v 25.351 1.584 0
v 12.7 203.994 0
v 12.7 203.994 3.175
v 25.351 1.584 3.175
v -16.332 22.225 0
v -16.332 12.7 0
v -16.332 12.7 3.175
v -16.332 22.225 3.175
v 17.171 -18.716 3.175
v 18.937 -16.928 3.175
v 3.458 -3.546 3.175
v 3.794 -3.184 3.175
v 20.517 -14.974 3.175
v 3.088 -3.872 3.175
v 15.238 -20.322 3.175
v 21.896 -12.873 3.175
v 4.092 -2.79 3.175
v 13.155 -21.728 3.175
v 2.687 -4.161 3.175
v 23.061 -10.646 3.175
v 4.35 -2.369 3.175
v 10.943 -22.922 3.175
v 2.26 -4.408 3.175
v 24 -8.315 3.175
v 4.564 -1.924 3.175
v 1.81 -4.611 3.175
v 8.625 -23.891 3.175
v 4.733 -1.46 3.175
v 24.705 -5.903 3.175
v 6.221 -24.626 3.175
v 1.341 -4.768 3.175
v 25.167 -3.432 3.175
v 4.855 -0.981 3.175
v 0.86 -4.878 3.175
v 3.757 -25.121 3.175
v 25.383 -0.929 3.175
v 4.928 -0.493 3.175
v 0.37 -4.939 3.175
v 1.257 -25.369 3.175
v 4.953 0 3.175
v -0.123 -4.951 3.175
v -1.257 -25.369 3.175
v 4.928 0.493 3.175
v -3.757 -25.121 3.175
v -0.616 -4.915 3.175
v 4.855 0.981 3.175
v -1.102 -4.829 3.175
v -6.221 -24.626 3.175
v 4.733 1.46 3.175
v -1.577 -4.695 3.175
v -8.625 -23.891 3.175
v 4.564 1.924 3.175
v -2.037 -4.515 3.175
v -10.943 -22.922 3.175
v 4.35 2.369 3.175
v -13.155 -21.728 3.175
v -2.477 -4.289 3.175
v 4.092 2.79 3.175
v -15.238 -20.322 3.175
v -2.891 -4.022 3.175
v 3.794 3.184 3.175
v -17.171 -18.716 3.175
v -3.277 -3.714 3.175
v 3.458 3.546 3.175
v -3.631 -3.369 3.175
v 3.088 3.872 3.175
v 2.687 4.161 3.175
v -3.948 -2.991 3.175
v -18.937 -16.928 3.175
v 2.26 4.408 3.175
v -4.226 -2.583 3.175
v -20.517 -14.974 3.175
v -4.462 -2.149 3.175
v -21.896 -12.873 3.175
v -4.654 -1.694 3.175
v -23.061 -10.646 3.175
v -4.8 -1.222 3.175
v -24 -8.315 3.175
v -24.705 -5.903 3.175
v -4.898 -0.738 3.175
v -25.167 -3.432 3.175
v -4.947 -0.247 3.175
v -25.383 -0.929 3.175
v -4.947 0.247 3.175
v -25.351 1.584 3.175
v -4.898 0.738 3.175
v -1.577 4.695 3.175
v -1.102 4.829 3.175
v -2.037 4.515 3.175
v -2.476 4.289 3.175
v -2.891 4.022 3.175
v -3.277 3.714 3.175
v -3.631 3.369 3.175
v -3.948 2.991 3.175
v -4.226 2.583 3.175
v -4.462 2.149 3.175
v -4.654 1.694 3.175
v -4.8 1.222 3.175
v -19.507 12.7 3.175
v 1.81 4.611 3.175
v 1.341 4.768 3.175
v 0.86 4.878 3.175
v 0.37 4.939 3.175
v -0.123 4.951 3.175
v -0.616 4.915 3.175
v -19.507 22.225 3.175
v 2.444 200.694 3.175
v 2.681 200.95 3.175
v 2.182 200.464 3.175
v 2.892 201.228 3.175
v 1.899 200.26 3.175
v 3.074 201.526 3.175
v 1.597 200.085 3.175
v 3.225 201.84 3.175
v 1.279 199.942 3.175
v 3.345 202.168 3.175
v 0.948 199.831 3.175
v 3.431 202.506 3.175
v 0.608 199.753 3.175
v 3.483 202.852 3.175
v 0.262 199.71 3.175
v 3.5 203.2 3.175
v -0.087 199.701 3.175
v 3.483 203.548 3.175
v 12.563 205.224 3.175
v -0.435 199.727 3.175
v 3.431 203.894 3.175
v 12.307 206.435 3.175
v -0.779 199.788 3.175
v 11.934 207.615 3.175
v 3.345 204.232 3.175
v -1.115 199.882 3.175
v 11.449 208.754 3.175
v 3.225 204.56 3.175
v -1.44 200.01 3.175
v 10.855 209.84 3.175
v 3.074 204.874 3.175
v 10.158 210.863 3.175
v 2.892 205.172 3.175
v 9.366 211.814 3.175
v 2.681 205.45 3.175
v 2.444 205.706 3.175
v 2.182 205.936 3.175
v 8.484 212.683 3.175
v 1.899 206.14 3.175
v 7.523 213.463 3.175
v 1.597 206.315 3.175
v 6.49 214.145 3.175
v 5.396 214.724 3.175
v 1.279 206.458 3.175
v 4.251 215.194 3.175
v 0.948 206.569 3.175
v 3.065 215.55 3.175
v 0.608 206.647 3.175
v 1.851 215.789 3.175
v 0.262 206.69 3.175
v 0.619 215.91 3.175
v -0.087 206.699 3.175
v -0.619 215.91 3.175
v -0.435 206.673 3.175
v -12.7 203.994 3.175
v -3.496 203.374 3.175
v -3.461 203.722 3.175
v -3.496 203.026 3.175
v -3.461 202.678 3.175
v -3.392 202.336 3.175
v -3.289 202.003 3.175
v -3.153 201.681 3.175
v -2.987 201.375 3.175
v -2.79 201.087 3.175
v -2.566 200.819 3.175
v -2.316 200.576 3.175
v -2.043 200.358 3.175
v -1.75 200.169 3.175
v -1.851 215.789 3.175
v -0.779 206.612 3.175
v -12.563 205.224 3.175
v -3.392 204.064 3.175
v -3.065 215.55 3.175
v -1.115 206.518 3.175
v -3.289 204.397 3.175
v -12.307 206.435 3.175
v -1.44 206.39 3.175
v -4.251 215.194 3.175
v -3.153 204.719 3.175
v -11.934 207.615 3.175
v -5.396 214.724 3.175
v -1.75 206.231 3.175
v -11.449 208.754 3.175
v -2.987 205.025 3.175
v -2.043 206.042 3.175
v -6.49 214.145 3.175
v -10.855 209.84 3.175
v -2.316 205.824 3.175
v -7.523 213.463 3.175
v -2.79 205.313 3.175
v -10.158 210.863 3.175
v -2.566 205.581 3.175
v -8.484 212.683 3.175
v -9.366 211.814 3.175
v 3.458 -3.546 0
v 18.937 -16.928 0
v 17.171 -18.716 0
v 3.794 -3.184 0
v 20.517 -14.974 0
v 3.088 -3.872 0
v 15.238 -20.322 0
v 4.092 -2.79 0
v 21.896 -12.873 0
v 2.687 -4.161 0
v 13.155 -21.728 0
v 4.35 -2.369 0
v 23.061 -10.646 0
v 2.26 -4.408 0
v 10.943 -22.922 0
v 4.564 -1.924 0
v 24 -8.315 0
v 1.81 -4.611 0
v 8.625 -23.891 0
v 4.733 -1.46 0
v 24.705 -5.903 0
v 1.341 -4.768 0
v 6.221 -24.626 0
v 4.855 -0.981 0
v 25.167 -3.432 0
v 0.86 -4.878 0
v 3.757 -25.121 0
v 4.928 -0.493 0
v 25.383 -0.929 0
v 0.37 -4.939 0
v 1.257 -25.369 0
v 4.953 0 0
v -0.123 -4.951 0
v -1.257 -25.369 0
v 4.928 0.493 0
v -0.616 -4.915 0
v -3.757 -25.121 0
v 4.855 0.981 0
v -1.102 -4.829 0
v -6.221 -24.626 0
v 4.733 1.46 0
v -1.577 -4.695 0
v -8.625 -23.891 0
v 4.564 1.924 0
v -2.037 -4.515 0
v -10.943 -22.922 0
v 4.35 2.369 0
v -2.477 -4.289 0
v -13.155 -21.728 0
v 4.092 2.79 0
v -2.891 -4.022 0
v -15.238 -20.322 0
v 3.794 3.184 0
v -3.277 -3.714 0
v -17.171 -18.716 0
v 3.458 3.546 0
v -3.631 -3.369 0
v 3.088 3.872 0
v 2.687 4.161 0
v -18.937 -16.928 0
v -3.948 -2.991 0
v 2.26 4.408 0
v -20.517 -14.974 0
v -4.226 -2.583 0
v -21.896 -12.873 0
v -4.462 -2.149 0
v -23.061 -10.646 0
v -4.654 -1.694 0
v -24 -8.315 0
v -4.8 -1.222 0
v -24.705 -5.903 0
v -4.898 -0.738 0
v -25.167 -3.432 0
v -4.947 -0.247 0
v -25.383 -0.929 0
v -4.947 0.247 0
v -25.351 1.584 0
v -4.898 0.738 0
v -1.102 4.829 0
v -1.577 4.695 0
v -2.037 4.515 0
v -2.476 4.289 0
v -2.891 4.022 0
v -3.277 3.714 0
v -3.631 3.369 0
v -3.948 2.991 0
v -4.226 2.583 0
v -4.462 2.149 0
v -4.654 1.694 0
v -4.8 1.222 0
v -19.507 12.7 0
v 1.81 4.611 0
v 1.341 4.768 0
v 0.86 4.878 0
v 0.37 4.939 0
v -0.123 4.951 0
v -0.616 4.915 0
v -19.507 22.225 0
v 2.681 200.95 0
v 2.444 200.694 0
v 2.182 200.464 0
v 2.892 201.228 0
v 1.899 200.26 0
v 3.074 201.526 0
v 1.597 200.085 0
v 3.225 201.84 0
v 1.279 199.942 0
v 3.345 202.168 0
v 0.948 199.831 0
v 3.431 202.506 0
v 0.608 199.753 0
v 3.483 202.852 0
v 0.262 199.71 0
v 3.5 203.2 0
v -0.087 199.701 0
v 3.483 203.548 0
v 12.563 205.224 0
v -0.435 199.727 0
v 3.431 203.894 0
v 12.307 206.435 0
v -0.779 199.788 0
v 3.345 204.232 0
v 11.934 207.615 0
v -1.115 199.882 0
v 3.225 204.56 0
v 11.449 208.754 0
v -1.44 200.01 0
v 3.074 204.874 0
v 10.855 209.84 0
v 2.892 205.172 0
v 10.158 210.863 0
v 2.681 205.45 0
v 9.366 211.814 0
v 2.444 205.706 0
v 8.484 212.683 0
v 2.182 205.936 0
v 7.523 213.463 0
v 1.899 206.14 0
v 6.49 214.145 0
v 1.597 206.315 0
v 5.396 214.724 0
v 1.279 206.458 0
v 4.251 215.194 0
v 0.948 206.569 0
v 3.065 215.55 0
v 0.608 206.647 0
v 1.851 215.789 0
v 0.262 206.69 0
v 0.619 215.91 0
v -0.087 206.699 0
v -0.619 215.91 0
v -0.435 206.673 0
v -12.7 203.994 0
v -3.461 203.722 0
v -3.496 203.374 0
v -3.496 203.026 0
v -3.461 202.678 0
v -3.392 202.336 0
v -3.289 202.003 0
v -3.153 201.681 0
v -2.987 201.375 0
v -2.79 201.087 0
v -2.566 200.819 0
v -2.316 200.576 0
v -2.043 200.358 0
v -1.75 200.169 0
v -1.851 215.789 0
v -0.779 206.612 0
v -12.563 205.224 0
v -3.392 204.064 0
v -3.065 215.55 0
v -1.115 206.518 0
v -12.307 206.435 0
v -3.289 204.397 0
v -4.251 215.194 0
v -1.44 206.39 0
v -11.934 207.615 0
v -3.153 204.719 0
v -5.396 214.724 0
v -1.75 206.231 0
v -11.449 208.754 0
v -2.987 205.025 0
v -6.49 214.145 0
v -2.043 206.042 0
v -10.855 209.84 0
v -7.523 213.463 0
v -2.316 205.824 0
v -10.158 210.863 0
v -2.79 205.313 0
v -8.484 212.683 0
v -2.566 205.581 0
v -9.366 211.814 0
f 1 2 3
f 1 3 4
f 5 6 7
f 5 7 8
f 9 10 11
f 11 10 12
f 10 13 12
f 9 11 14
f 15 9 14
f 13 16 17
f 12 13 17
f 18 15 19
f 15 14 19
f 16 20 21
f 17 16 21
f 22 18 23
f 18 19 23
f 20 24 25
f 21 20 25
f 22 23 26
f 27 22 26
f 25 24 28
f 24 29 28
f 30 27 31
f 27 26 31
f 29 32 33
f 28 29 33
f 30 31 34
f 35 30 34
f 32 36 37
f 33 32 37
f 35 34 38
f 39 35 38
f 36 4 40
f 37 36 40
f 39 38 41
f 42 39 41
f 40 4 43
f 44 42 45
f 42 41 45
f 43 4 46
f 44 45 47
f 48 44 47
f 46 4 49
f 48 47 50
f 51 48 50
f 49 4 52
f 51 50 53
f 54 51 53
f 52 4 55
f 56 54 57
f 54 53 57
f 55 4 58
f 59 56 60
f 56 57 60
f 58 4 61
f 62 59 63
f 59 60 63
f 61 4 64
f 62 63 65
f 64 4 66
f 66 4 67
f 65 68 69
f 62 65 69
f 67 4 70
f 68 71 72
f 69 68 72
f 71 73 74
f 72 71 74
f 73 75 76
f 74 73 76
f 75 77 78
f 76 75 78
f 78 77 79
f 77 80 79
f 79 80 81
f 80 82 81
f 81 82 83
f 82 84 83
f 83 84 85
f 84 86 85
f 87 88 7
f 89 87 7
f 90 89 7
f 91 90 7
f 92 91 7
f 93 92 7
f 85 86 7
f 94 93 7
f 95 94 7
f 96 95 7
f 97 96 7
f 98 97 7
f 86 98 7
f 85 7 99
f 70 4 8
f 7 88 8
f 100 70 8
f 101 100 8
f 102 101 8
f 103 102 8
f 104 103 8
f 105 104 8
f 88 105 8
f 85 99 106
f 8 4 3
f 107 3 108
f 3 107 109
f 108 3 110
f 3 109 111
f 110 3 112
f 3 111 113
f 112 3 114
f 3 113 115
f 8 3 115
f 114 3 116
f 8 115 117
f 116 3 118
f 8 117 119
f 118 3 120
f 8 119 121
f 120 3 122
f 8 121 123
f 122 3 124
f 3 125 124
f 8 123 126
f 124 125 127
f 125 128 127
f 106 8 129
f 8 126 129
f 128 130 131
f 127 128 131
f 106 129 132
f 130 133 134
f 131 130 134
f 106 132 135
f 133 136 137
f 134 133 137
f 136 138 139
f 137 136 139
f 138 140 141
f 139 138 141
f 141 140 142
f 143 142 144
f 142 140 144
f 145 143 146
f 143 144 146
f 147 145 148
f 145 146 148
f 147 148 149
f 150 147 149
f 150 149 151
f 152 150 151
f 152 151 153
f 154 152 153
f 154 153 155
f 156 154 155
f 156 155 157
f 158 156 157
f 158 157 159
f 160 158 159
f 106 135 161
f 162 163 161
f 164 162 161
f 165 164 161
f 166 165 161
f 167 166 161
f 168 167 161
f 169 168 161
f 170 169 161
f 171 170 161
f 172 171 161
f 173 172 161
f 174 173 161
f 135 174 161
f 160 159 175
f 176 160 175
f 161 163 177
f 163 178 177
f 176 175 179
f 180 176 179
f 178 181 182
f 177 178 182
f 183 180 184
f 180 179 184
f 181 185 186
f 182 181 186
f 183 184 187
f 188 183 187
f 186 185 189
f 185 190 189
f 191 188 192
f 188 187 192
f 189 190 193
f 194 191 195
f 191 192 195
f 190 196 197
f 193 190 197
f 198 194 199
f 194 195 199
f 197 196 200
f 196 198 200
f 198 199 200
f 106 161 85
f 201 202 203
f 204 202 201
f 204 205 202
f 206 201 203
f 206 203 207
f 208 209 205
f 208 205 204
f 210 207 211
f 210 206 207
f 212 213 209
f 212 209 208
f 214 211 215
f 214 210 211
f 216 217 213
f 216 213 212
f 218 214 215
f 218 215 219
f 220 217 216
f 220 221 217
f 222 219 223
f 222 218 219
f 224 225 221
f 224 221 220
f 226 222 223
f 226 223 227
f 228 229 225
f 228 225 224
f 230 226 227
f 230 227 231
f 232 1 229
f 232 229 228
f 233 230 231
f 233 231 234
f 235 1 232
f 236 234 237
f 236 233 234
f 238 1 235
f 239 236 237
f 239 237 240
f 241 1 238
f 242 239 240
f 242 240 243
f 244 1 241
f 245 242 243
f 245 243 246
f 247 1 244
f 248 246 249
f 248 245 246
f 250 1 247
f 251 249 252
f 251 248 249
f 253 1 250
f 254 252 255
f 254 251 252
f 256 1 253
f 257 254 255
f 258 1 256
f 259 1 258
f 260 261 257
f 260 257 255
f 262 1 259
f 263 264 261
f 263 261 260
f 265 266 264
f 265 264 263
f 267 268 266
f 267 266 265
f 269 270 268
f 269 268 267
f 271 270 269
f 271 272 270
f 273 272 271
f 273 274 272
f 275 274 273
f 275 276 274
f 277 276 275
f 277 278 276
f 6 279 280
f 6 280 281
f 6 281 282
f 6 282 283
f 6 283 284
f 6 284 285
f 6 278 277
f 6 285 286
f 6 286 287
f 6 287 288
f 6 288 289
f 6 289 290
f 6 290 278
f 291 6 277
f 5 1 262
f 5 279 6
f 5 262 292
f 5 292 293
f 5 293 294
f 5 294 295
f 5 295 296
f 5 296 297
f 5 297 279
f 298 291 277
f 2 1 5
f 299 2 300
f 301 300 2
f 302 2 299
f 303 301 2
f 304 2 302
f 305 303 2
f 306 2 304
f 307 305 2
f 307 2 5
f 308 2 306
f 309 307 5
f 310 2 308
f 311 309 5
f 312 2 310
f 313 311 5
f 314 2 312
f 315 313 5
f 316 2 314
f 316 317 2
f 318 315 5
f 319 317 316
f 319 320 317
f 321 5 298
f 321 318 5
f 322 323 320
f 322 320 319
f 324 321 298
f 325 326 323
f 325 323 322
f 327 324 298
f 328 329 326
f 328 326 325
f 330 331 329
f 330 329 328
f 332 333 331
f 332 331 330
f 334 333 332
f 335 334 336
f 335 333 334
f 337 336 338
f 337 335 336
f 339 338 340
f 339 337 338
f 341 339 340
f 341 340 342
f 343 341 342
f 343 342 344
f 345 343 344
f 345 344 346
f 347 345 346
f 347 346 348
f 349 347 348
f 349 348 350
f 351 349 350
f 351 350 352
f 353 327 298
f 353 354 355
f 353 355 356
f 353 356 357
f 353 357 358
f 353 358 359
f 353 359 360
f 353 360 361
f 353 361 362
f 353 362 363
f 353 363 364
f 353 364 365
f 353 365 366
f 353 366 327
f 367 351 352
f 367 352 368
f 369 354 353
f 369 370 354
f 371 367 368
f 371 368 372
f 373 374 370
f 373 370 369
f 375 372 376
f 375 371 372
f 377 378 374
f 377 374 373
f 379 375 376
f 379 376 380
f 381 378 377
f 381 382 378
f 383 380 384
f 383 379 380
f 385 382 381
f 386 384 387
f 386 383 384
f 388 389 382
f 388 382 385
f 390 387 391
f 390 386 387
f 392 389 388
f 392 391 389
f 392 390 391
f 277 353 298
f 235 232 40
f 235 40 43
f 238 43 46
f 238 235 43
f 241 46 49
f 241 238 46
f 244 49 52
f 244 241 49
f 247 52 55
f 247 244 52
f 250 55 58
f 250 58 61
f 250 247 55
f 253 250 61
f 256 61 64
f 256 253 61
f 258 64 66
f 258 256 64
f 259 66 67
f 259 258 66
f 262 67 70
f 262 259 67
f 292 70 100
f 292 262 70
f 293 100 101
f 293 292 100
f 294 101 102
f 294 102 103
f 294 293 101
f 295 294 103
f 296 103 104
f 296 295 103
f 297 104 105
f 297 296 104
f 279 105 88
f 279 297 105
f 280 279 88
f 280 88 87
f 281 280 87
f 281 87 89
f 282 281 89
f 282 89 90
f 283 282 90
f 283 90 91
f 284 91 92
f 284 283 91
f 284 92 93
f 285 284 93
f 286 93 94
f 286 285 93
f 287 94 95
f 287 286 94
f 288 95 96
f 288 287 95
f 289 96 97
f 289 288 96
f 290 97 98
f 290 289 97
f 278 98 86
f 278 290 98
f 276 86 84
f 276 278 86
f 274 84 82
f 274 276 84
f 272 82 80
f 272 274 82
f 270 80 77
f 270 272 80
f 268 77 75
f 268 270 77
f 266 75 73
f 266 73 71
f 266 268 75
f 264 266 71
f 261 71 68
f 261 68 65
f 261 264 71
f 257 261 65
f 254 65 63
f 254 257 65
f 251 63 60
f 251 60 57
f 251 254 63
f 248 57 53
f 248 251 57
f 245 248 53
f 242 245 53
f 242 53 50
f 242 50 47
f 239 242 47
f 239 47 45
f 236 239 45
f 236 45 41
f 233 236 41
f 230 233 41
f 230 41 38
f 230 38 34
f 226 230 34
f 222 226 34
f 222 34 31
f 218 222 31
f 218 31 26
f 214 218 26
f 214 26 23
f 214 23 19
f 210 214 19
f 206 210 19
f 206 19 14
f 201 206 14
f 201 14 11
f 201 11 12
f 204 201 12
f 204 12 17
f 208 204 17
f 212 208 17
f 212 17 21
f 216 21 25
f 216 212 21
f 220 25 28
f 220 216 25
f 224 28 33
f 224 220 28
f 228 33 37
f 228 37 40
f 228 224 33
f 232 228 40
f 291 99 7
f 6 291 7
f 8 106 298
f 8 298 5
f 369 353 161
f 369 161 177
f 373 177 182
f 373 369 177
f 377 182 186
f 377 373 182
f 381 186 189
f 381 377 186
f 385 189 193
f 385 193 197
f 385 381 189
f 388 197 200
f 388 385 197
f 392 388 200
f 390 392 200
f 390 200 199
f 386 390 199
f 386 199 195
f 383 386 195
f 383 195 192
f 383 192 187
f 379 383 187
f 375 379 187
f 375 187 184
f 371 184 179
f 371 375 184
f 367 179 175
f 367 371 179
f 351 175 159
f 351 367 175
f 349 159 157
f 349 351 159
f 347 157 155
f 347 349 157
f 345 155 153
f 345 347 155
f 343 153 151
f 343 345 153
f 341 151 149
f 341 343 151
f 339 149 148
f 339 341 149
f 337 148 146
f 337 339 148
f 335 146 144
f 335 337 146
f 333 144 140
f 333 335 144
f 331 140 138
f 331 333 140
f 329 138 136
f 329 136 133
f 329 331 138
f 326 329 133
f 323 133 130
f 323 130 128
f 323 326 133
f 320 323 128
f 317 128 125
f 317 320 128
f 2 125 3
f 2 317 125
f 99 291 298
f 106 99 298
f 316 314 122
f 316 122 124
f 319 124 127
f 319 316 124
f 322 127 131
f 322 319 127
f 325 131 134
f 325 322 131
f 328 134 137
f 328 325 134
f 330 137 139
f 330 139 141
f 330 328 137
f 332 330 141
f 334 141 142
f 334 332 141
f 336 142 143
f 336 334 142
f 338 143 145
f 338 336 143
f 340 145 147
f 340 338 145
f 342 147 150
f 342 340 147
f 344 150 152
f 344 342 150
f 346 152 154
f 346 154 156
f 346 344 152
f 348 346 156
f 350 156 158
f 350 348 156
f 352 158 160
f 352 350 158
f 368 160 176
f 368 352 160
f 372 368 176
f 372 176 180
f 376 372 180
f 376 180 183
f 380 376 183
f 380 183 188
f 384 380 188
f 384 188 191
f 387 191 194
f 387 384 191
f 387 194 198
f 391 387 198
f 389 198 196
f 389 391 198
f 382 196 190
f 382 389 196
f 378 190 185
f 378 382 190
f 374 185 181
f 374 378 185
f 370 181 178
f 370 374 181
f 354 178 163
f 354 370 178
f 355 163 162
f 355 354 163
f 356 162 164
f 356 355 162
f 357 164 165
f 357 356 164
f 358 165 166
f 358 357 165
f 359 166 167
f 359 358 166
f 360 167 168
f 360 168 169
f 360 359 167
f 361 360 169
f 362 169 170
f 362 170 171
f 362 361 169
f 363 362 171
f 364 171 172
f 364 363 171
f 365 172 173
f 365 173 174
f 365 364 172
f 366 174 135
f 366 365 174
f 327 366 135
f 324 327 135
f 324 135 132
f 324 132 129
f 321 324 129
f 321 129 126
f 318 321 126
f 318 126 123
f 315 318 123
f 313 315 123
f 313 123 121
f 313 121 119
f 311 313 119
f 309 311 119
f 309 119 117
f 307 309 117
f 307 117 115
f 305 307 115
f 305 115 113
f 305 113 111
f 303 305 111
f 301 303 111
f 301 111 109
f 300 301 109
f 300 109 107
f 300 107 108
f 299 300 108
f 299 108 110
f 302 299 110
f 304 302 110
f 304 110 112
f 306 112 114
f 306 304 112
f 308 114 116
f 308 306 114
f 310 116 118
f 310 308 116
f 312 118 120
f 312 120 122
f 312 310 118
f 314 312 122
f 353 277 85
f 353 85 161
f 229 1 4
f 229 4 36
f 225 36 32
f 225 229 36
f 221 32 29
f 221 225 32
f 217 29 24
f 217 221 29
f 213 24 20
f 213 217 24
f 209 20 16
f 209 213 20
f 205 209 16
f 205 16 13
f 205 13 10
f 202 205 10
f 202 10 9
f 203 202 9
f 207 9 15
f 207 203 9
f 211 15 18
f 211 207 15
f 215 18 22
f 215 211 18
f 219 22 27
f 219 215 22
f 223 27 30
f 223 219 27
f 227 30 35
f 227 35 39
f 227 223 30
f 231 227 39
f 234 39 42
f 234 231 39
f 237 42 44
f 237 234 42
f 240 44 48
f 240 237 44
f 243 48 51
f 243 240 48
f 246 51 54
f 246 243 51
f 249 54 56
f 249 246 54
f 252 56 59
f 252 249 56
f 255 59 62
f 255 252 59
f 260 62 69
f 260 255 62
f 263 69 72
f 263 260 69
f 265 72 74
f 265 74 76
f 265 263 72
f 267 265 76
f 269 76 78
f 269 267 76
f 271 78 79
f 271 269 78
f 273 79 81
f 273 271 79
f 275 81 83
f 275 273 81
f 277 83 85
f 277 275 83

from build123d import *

# Parameters (mm, degrees)
SKETCH1_R           = 4.953
SKETCH1_R_2         = 3.5
SKETCH1_W           = 3.175
SKETCH1_H           = 9.525
BOSS_EXTRUDE1_DEPTH = 3.175


with BuildPart() as part:
    # Sketch1 → Boss-Extrude1 (new body)
    with BuildSketch(Plane.XY):
        with BuildLine():
            Line((-25.350535869, 1.58440246), (-12.7, 203.993746978))
            ThreePointArc((-12.7, 203.993746978), (0, 215.924780323), (12.7, 203.993746978))
            Line((12.7, 203.993746978), (25.350535869, 1.58440246))
            ThreePointArc((25.350535869, 1.58440246), (0, -25.4), (-25.350535869, 1.58440246))
        make_face()
        Circle(SKETCH1_R, mode=Mode.SUBTRACT)
        with Locations((0, 203.2)):
            Circle(SKETCH1_R_2, mode=Mode.SUBTRACT)
        with Locations((-17.9197, 17.4625)):
            Rectangle(SKETCH1_W, SKETCH1_H, mode=Mode.SUBTRACT)
    extrude(amount=BOSS_EXTRUDE1_DEPTH)


solid = part.part
